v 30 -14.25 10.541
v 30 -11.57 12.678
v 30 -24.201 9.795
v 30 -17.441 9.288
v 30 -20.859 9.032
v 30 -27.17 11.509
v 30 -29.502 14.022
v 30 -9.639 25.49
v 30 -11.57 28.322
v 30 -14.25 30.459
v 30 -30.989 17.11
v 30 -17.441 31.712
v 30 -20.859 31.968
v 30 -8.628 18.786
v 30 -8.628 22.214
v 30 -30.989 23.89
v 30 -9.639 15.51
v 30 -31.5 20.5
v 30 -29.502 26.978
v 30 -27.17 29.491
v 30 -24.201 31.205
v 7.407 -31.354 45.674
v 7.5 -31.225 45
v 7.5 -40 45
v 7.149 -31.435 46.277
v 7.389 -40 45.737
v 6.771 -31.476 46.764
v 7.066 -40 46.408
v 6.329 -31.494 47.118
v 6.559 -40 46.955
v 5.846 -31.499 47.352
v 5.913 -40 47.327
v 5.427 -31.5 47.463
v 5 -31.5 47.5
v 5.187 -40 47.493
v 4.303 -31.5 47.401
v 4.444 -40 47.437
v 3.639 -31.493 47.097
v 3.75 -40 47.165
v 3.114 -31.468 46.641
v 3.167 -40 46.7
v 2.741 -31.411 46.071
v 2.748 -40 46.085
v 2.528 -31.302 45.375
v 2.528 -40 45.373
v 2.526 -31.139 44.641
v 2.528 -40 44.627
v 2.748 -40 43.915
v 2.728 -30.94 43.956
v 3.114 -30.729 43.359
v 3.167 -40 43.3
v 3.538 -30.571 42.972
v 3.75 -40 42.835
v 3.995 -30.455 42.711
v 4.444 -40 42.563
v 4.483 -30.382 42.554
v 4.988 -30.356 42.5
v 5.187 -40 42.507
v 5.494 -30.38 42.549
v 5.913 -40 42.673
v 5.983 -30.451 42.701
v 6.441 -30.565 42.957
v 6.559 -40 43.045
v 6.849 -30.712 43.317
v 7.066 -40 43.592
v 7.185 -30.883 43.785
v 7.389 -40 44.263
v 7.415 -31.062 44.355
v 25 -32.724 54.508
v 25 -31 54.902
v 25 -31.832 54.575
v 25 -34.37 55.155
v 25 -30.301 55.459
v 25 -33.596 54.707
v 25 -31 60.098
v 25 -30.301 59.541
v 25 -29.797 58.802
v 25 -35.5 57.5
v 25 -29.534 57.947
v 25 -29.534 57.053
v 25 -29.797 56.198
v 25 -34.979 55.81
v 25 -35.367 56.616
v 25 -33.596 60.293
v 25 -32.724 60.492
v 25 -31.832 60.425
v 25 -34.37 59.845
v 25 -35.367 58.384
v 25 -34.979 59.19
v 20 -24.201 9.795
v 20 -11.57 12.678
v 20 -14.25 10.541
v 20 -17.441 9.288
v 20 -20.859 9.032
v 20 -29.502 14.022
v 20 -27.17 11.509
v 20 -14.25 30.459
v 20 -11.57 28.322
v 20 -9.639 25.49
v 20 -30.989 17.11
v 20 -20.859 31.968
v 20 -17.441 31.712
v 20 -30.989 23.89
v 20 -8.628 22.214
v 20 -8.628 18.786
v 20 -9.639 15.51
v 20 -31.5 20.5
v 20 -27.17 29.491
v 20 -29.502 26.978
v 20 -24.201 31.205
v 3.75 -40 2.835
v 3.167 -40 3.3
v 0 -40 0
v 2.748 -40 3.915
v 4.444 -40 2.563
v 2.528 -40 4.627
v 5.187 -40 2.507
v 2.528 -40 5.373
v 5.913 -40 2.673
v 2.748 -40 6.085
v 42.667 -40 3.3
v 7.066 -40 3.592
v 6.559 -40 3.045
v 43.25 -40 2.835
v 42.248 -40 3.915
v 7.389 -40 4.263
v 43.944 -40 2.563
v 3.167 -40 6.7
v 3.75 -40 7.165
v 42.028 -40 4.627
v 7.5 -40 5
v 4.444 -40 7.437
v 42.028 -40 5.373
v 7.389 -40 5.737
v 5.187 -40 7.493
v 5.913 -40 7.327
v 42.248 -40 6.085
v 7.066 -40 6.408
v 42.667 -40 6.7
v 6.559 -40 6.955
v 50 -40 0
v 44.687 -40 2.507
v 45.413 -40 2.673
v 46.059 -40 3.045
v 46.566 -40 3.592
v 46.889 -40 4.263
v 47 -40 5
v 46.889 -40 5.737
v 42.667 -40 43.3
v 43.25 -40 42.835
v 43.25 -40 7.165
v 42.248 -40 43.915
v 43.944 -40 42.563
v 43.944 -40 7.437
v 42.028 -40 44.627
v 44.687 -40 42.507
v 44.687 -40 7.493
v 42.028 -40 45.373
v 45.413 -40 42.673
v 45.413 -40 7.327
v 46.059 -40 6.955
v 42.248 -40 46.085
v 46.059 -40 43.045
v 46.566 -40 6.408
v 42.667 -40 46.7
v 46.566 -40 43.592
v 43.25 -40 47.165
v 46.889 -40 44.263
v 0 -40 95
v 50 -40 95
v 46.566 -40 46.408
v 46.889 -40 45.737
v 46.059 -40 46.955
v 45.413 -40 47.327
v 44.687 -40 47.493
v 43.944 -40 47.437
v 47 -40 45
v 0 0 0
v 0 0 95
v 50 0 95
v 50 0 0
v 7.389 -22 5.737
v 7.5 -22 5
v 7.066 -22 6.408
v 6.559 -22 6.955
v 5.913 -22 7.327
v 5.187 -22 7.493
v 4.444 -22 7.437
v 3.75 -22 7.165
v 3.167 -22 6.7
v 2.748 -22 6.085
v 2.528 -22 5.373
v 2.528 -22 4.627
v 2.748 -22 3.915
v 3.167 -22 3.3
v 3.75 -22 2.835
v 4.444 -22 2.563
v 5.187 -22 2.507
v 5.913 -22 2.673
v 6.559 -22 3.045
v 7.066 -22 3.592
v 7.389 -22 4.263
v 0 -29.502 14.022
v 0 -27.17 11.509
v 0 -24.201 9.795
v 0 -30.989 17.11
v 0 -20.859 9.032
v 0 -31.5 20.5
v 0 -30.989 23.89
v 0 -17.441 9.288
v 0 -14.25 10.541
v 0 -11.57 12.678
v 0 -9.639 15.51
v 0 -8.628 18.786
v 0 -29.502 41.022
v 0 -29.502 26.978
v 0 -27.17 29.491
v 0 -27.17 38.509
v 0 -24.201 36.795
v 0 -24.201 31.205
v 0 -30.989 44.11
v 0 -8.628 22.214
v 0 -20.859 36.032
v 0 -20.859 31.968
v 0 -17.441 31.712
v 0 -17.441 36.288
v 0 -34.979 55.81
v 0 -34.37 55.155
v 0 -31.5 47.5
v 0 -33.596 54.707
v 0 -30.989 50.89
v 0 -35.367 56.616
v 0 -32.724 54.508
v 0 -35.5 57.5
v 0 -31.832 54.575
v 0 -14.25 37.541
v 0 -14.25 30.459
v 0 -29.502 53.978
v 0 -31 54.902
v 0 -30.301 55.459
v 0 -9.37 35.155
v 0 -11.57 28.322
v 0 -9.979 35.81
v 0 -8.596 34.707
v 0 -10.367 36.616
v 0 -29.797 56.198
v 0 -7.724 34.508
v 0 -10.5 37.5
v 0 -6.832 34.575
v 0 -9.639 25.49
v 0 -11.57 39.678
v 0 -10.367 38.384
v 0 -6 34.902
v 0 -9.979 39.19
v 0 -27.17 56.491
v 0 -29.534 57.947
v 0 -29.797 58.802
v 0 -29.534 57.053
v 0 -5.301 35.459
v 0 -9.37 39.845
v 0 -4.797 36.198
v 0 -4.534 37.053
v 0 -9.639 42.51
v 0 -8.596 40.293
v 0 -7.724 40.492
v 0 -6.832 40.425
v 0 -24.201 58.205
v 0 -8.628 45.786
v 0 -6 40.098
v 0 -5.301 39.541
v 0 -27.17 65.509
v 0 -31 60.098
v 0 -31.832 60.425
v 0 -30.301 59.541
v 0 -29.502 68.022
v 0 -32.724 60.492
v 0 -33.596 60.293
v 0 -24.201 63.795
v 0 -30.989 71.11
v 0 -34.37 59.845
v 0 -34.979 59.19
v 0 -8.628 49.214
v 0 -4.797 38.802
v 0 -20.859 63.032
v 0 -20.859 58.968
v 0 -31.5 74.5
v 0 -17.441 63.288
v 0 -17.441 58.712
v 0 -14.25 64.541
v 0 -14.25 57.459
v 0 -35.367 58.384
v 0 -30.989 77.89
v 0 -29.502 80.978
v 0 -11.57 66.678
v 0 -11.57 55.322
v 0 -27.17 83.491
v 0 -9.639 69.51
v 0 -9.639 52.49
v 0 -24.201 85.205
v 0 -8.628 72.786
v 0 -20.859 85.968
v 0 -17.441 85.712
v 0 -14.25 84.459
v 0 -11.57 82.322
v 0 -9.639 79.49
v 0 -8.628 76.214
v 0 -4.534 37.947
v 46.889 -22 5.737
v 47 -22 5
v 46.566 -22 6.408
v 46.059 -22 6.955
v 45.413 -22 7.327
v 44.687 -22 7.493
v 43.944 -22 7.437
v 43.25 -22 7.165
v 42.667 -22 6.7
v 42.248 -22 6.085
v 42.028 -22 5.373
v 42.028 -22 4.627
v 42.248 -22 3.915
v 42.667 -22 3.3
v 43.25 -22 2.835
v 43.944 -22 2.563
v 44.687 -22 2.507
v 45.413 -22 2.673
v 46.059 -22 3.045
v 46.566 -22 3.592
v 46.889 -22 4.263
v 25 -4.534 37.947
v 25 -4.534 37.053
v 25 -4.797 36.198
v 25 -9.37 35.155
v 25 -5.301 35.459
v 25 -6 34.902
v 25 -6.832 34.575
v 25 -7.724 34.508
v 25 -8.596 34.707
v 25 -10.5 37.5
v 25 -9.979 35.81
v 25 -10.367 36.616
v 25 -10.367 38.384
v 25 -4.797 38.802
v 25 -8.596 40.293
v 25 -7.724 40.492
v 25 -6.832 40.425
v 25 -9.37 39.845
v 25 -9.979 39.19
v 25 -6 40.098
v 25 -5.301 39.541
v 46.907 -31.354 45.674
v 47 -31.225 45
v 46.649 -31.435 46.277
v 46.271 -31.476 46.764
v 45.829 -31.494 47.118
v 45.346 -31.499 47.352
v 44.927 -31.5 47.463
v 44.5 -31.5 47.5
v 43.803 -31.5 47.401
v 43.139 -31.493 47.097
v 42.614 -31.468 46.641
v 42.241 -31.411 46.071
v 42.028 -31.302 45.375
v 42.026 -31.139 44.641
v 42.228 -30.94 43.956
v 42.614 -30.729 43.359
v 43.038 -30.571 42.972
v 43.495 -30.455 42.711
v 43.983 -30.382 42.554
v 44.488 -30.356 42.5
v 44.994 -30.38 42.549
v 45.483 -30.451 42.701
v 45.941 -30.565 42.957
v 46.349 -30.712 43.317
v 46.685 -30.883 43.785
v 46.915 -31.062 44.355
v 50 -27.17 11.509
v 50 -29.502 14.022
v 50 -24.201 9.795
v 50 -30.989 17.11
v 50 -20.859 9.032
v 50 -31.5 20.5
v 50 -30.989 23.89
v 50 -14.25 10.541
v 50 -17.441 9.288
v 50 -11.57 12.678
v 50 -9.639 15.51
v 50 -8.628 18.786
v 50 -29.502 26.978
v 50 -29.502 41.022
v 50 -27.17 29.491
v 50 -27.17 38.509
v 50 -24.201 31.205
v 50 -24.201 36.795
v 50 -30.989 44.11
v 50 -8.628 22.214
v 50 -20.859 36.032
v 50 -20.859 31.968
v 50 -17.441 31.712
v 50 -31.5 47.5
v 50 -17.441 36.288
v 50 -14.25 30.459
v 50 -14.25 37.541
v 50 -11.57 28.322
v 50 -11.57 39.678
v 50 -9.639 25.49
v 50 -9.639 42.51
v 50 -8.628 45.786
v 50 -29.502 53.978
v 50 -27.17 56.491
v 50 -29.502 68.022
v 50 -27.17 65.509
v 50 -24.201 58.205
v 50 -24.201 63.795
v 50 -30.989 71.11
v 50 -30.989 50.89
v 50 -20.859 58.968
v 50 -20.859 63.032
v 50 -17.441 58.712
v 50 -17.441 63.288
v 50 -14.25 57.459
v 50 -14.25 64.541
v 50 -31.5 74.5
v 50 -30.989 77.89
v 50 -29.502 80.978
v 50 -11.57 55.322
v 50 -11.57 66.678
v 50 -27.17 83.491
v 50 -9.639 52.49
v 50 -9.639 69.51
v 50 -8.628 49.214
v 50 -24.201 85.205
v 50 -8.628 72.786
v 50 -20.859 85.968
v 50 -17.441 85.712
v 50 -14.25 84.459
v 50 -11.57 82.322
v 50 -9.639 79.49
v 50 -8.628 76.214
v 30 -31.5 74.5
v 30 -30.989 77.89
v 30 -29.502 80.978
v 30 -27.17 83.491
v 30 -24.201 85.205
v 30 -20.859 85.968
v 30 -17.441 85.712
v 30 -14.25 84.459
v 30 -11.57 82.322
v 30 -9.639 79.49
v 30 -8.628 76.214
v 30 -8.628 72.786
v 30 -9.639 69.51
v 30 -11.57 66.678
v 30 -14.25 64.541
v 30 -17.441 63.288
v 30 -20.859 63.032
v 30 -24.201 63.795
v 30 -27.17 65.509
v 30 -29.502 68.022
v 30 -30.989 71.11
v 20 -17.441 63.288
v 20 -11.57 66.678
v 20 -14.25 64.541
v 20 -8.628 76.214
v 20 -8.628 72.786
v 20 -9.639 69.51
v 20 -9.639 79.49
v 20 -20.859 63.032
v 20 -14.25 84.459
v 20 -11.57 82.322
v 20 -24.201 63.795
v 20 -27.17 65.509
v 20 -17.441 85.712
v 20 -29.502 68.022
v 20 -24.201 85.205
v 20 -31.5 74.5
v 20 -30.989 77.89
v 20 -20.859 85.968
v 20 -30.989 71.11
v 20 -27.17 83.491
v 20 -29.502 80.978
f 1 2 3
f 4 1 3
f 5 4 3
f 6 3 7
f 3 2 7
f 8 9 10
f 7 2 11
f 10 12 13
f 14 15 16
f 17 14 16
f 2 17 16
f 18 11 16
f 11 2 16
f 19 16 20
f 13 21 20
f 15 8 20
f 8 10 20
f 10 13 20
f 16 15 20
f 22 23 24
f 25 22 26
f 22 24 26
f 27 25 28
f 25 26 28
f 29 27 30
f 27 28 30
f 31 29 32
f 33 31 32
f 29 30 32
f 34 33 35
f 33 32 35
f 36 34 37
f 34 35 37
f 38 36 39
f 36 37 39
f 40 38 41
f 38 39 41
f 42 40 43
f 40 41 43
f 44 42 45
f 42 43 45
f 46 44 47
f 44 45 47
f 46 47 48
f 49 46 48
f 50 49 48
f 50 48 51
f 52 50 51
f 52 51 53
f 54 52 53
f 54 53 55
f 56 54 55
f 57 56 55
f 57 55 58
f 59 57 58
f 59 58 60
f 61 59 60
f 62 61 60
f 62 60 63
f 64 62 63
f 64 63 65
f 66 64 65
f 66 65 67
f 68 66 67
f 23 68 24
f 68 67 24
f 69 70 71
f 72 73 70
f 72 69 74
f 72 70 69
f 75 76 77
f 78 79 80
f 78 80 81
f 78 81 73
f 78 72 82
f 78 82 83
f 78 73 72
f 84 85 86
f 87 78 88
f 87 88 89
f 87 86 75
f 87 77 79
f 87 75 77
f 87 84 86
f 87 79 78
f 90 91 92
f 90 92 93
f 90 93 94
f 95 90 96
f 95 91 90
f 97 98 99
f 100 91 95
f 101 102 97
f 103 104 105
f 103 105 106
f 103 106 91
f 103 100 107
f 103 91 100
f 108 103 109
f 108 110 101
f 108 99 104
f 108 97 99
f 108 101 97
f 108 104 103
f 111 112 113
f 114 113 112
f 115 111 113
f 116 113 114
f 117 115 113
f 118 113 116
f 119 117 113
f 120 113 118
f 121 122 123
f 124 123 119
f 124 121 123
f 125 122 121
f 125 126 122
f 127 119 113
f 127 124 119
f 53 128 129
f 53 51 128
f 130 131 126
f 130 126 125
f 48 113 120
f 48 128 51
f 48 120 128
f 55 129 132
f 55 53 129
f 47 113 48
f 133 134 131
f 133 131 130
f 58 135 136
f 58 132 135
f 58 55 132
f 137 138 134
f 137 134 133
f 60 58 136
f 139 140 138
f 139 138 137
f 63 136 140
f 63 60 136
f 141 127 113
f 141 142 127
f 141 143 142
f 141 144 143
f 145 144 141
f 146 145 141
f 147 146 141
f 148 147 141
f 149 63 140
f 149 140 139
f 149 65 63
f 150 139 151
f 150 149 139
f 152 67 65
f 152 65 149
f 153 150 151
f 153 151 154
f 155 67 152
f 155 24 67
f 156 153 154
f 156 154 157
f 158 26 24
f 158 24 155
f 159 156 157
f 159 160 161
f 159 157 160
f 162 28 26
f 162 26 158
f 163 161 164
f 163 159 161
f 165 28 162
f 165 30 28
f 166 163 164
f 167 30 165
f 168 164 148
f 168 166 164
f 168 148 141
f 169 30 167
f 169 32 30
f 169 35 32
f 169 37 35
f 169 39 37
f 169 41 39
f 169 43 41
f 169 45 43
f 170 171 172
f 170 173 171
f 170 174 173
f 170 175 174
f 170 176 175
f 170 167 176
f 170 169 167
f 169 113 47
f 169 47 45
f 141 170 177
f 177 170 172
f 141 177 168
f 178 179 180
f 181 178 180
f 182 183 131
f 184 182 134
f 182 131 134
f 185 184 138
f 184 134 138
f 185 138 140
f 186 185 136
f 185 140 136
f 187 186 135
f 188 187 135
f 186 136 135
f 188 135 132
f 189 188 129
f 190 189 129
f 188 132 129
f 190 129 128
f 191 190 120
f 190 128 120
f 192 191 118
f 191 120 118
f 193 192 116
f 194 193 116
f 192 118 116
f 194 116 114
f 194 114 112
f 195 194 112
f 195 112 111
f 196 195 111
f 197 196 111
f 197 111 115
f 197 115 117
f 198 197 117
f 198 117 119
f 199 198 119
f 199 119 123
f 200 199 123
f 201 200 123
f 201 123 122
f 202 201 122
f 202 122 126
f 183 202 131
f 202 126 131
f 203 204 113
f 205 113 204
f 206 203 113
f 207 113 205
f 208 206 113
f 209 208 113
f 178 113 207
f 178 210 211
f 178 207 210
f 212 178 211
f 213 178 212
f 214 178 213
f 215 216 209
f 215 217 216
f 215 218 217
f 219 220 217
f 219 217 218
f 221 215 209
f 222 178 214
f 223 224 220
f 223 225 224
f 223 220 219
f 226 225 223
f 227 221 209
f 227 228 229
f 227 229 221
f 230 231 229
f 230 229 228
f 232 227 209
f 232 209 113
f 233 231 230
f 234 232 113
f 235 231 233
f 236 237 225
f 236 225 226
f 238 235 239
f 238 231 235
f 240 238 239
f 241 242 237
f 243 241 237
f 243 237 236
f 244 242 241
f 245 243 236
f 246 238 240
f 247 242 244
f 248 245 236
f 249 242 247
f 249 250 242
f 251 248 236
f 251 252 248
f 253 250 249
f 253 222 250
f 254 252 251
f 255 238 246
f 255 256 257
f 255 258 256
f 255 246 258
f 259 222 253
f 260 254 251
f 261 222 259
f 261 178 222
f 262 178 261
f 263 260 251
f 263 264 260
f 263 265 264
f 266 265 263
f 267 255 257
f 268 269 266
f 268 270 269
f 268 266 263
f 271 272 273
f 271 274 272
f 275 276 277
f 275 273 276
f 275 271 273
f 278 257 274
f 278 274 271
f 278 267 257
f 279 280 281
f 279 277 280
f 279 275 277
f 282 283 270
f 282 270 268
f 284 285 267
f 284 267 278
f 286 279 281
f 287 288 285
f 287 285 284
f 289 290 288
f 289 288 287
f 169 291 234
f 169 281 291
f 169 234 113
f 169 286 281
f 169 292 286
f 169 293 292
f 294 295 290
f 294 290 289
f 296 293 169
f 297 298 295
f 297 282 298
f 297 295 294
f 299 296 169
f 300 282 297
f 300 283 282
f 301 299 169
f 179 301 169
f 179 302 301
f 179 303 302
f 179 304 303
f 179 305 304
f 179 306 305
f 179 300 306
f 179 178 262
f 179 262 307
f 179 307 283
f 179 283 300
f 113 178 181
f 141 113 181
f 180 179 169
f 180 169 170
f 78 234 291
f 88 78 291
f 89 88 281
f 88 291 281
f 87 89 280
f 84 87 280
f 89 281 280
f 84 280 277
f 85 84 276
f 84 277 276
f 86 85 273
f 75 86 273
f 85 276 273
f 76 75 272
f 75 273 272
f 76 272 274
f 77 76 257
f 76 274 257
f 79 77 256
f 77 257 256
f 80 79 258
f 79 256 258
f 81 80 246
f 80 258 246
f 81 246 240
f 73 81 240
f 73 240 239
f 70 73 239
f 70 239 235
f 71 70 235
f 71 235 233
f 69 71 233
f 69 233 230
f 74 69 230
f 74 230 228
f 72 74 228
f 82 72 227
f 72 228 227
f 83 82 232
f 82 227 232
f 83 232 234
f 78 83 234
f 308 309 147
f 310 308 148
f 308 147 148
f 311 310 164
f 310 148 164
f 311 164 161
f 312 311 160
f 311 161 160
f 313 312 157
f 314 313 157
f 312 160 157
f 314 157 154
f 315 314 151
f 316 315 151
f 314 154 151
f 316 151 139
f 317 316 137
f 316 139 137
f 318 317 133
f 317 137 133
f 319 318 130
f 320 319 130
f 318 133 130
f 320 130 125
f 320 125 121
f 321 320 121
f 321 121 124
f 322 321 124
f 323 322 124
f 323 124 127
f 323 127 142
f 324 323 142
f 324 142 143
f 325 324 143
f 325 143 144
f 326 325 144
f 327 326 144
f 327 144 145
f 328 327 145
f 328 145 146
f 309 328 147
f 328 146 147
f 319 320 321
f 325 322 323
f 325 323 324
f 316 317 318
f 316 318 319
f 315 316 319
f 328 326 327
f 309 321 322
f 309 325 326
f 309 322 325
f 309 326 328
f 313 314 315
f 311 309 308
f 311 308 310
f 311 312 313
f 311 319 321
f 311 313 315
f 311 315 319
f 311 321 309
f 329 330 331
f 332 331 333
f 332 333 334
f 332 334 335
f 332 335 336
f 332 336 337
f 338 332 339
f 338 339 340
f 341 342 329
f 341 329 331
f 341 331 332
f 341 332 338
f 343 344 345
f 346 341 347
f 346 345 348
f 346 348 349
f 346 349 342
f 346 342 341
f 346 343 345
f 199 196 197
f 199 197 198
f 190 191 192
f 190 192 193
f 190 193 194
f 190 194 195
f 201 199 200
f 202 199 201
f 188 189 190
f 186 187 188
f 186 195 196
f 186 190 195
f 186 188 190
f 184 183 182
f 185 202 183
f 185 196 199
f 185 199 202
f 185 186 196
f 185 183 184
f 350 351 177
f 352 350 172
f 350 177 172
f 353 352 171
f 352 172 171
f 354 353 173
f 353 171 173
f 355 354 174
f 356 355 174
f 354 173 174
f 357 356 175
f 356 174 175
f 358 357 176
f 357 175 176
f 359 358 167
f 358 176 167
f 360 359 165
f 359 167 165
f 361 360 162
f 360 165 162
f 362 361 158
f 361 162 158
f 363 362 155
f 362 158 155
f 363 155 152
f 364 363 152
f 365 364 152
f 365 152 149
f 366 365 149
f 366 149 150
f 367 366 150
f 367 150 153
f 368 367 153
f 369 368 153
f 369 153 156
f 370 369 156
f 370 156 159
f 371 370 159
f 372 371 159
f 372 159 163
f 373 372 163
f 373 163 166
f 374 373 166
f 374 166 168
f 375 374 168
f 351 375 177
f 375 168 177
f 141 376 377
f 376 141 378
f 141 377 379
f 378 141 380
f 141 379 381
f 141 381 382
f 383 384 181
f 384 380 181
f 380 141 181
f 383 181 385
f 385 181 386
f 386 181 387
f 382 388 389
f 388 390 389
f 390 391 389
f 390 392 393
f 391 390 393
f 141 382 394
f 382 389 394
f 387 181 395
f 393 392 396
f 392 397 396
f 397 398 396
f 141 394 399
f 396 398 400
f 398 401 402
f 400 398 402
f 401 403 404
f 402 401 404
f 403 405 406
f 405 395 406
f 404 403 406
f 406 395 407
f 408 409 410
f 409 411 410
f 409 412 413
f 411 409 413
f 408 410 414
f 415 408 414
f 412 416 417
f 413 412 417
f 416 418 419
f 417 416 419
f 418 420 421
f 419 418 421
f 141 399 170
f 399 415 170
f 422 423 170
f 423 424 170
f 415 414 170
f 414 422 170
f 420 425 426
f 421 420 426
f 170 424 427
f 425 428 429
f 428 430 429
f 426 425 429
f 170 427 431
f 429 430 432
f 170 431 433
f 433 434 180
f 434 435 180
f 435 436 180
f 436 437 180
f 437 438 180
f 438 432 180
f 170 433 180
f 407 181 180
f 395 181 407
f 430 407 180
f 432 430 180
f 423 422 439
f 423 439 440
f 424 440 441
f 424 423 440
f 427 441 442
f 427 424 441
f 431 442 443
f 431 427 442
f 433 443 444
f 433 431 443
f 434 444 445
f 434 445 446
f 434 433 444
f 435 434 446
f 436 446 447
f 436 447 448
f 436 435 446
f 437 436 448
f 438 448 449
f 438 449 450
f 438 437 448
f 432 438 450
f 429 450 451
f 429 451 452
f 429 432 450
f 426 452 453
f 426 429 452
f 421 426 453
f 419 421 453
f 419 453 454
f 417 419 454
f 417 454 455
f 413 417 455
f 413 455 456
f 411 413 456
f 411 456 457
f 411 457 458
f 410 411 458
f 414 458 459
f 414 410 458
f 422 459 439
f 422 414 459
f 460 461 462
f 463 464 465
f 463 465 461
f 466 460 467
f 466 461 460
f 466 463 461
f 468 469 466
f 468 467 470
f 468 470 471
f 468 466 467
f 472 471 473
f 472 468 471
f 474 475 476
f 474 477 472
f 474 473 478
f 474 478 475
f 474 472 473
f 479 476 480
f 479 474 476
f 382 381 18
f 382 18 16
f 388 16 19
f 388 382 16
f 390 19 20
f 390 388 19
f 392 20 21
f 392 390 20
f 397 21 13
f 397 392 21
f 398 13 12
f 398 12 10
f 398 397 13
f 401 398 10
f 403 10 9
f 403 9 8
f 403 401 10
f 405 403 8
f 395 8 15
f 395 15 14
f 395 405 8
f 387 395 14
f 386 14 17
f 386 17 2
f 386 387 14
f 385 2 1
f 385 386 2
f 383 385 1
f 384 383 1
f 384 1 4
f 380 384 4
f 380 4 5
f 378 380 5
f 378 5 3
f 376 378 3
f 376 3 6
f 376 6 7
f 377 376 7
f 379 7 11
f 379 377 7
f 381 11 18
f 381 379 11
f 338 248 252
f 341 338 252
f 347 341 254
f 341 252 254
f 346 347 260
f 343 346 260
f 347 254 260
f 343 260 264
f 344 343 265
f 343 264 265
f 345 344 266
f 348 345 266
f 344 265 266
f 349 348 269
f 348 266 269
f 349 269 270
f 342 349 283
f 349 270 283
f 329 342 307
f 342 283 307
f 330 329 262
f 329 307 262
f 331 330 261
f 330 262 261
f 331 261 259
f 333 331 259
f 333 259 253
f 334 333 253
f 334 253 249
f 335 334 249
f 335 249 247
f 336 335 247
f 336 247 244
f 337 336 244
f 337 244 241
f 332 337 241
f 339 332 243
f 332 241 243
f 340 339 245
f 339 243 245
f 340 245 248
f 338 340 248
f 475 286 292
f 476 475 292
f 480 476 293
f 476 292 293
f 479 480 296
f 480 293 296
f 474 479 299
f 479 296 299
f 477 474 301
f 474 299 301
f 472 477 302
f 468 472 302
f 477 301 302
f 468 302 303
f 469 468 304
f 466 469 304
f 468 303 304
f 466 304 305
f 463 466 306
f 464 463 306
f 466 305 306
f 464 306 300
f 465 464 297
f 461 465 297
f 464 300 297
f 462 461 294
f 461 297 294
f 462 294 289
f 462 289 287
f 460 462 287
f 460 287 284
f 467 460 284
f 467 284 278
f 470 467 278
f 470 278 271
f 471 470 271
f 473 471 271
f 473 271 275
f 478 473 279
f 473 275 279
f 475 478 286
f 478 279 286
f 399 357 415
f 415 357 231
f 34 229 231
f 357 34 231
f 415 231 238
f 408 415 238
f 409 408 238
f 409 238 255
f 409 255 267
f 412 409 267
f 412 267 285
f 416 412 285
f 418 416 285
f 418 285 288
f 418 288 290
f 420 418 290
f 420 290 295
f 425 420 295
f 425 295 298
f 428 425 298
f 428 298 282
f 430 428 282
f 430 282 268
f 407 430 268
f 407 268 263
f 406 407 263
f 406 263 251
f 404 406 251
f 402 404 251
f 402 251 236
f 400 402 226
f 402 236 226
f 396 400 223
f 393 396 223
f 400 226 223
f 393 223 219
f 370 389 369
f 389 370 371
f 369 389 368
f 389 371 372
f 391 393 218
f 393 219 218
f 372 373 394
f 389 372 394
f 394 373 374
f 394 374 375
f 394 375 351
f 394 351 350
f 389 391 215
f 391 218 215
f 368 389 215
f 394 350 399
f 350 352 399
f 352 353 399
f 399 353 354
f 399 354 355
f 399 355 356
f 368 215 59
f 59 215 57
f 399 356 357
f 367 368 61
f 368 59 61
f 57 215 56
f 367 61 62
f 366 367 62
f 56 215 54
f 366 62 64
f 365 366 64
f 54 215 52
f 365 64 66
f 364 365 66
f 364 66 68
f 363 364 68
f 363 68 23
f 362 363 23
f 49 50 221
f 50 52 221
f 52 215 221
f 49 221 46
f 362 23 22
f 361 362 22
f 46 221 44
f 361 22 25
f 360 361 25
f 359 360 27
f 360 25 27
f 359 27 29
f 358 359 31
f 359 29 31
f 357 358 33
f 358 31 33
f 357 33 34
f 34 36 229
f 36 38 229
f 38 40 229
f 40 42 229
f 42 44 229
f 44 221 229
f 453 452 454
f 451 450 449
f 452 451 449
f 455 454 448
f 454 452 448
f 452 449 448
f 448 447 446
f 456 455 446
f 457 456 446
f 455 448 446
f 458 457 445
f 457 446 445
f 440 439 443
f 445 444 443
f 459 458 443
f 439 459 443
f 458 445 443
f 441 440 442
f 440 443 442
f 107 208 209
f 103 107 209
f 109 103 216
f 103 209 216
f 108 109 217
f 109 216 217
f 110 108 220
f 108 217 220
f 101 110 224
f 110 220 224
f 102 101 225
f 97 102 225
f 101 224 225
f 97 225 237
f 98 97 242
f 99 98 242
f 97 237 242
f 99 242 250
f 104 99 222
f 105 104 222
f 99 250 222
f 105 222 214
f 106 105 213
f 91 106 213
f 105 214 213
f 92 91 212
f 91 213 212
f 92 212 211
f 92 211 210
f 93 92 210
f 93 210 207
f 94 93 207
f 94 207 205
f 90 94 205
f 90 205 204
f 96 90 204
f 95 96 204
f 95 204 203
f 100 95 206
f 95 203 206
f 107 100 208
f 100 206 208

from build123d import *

# Parameters (mm, degrees)
F0_W      = 50
F0_H      = 95
F1_DEPTH  = 40
F2_R      = 2.5
F3_DEPTH  = 18
F4_R      = 11.5
F5_DEPTH  = 20
F7_R      = 11.5
F8_DEPTH  = 50.001
F9_R      = 3
F10_DEPTH = 25


# Not quite as in the source:
# - a pattern or mirror of a feature is missing from the dataset's text; its kind, count and spacing are read off the source's solid


with BuildPart() as f1:
    # F0 (on Front) → F1 (new body)
    with BuildSketch(Plane.XZ):
        with Locations((25, 47.5)):
            Rectangle(F0_W, F0_H)
    extrude(amount=F1_DEPTH)

    # F2 (on face) → F3 (cut)
    with BuildSketch(Plane.XZ.offset(40)):
        with Locations((5, 5)):
            Circle(F2_R)
        with Locations((44.5, 5)):
            Circle(F2_R)
        with Locations((5, 45)):
            Circle(F2_R)
        with Locations((44.5, 45)):
            Circle(F2_R)
    extrude(amount=-F3_DEPTH, mode=Mode.SUBTRACT)

    # F4 (on face) → F5 (cut)
    with BuildSketch(Plane(origin=(0, 0, 0), x_dir=(0, -1, 0), z_dir=(-1, 0, 0))):
        with Locations((20, 74.5)):
            Circle(F4_R)
        with Locations((20, 20.5)):
            Circle(F4_R)
    f5 = extrude(amount=-F5_DEPTH, mode=Mode.SUBTRACT)

    # F5_copies: F5 across plane
    add(f5.mirror(Plane(origin=(25, 0, 0), x_dir=(0, 0, 1), z_dir=(1, 0, 0))), mode=Mode.SUBTRACT)

    # F7 (on face) → F8 (cut, through all)
    with BuildSketch(Plane(origin=(0, 0, 0), x_dir=(0, -1, 0), z_dir=(-1, 0, 0))):
        with Locations((20, 47.5)):
            Circle(F7_R)
    extrude(amount=-F8_DEPTH, mode=Mode.SUBTRACT)

    # F9 (on face) → F10 (cut)
    with BuildSketch(Plane(origin=(0, 0, 0), x_dir=(0, -1, 0), z_dir=(-1, 0, 0))):
        with Locations((32.5, 57.5)):
            Circle(F9_R)
        with Locations((7.5, 37.5)):
            Circle(F9_R)
    extrude(amount=-F10_DEPTH, mode=Mode.SUBTRACT)


solid = f1.part
